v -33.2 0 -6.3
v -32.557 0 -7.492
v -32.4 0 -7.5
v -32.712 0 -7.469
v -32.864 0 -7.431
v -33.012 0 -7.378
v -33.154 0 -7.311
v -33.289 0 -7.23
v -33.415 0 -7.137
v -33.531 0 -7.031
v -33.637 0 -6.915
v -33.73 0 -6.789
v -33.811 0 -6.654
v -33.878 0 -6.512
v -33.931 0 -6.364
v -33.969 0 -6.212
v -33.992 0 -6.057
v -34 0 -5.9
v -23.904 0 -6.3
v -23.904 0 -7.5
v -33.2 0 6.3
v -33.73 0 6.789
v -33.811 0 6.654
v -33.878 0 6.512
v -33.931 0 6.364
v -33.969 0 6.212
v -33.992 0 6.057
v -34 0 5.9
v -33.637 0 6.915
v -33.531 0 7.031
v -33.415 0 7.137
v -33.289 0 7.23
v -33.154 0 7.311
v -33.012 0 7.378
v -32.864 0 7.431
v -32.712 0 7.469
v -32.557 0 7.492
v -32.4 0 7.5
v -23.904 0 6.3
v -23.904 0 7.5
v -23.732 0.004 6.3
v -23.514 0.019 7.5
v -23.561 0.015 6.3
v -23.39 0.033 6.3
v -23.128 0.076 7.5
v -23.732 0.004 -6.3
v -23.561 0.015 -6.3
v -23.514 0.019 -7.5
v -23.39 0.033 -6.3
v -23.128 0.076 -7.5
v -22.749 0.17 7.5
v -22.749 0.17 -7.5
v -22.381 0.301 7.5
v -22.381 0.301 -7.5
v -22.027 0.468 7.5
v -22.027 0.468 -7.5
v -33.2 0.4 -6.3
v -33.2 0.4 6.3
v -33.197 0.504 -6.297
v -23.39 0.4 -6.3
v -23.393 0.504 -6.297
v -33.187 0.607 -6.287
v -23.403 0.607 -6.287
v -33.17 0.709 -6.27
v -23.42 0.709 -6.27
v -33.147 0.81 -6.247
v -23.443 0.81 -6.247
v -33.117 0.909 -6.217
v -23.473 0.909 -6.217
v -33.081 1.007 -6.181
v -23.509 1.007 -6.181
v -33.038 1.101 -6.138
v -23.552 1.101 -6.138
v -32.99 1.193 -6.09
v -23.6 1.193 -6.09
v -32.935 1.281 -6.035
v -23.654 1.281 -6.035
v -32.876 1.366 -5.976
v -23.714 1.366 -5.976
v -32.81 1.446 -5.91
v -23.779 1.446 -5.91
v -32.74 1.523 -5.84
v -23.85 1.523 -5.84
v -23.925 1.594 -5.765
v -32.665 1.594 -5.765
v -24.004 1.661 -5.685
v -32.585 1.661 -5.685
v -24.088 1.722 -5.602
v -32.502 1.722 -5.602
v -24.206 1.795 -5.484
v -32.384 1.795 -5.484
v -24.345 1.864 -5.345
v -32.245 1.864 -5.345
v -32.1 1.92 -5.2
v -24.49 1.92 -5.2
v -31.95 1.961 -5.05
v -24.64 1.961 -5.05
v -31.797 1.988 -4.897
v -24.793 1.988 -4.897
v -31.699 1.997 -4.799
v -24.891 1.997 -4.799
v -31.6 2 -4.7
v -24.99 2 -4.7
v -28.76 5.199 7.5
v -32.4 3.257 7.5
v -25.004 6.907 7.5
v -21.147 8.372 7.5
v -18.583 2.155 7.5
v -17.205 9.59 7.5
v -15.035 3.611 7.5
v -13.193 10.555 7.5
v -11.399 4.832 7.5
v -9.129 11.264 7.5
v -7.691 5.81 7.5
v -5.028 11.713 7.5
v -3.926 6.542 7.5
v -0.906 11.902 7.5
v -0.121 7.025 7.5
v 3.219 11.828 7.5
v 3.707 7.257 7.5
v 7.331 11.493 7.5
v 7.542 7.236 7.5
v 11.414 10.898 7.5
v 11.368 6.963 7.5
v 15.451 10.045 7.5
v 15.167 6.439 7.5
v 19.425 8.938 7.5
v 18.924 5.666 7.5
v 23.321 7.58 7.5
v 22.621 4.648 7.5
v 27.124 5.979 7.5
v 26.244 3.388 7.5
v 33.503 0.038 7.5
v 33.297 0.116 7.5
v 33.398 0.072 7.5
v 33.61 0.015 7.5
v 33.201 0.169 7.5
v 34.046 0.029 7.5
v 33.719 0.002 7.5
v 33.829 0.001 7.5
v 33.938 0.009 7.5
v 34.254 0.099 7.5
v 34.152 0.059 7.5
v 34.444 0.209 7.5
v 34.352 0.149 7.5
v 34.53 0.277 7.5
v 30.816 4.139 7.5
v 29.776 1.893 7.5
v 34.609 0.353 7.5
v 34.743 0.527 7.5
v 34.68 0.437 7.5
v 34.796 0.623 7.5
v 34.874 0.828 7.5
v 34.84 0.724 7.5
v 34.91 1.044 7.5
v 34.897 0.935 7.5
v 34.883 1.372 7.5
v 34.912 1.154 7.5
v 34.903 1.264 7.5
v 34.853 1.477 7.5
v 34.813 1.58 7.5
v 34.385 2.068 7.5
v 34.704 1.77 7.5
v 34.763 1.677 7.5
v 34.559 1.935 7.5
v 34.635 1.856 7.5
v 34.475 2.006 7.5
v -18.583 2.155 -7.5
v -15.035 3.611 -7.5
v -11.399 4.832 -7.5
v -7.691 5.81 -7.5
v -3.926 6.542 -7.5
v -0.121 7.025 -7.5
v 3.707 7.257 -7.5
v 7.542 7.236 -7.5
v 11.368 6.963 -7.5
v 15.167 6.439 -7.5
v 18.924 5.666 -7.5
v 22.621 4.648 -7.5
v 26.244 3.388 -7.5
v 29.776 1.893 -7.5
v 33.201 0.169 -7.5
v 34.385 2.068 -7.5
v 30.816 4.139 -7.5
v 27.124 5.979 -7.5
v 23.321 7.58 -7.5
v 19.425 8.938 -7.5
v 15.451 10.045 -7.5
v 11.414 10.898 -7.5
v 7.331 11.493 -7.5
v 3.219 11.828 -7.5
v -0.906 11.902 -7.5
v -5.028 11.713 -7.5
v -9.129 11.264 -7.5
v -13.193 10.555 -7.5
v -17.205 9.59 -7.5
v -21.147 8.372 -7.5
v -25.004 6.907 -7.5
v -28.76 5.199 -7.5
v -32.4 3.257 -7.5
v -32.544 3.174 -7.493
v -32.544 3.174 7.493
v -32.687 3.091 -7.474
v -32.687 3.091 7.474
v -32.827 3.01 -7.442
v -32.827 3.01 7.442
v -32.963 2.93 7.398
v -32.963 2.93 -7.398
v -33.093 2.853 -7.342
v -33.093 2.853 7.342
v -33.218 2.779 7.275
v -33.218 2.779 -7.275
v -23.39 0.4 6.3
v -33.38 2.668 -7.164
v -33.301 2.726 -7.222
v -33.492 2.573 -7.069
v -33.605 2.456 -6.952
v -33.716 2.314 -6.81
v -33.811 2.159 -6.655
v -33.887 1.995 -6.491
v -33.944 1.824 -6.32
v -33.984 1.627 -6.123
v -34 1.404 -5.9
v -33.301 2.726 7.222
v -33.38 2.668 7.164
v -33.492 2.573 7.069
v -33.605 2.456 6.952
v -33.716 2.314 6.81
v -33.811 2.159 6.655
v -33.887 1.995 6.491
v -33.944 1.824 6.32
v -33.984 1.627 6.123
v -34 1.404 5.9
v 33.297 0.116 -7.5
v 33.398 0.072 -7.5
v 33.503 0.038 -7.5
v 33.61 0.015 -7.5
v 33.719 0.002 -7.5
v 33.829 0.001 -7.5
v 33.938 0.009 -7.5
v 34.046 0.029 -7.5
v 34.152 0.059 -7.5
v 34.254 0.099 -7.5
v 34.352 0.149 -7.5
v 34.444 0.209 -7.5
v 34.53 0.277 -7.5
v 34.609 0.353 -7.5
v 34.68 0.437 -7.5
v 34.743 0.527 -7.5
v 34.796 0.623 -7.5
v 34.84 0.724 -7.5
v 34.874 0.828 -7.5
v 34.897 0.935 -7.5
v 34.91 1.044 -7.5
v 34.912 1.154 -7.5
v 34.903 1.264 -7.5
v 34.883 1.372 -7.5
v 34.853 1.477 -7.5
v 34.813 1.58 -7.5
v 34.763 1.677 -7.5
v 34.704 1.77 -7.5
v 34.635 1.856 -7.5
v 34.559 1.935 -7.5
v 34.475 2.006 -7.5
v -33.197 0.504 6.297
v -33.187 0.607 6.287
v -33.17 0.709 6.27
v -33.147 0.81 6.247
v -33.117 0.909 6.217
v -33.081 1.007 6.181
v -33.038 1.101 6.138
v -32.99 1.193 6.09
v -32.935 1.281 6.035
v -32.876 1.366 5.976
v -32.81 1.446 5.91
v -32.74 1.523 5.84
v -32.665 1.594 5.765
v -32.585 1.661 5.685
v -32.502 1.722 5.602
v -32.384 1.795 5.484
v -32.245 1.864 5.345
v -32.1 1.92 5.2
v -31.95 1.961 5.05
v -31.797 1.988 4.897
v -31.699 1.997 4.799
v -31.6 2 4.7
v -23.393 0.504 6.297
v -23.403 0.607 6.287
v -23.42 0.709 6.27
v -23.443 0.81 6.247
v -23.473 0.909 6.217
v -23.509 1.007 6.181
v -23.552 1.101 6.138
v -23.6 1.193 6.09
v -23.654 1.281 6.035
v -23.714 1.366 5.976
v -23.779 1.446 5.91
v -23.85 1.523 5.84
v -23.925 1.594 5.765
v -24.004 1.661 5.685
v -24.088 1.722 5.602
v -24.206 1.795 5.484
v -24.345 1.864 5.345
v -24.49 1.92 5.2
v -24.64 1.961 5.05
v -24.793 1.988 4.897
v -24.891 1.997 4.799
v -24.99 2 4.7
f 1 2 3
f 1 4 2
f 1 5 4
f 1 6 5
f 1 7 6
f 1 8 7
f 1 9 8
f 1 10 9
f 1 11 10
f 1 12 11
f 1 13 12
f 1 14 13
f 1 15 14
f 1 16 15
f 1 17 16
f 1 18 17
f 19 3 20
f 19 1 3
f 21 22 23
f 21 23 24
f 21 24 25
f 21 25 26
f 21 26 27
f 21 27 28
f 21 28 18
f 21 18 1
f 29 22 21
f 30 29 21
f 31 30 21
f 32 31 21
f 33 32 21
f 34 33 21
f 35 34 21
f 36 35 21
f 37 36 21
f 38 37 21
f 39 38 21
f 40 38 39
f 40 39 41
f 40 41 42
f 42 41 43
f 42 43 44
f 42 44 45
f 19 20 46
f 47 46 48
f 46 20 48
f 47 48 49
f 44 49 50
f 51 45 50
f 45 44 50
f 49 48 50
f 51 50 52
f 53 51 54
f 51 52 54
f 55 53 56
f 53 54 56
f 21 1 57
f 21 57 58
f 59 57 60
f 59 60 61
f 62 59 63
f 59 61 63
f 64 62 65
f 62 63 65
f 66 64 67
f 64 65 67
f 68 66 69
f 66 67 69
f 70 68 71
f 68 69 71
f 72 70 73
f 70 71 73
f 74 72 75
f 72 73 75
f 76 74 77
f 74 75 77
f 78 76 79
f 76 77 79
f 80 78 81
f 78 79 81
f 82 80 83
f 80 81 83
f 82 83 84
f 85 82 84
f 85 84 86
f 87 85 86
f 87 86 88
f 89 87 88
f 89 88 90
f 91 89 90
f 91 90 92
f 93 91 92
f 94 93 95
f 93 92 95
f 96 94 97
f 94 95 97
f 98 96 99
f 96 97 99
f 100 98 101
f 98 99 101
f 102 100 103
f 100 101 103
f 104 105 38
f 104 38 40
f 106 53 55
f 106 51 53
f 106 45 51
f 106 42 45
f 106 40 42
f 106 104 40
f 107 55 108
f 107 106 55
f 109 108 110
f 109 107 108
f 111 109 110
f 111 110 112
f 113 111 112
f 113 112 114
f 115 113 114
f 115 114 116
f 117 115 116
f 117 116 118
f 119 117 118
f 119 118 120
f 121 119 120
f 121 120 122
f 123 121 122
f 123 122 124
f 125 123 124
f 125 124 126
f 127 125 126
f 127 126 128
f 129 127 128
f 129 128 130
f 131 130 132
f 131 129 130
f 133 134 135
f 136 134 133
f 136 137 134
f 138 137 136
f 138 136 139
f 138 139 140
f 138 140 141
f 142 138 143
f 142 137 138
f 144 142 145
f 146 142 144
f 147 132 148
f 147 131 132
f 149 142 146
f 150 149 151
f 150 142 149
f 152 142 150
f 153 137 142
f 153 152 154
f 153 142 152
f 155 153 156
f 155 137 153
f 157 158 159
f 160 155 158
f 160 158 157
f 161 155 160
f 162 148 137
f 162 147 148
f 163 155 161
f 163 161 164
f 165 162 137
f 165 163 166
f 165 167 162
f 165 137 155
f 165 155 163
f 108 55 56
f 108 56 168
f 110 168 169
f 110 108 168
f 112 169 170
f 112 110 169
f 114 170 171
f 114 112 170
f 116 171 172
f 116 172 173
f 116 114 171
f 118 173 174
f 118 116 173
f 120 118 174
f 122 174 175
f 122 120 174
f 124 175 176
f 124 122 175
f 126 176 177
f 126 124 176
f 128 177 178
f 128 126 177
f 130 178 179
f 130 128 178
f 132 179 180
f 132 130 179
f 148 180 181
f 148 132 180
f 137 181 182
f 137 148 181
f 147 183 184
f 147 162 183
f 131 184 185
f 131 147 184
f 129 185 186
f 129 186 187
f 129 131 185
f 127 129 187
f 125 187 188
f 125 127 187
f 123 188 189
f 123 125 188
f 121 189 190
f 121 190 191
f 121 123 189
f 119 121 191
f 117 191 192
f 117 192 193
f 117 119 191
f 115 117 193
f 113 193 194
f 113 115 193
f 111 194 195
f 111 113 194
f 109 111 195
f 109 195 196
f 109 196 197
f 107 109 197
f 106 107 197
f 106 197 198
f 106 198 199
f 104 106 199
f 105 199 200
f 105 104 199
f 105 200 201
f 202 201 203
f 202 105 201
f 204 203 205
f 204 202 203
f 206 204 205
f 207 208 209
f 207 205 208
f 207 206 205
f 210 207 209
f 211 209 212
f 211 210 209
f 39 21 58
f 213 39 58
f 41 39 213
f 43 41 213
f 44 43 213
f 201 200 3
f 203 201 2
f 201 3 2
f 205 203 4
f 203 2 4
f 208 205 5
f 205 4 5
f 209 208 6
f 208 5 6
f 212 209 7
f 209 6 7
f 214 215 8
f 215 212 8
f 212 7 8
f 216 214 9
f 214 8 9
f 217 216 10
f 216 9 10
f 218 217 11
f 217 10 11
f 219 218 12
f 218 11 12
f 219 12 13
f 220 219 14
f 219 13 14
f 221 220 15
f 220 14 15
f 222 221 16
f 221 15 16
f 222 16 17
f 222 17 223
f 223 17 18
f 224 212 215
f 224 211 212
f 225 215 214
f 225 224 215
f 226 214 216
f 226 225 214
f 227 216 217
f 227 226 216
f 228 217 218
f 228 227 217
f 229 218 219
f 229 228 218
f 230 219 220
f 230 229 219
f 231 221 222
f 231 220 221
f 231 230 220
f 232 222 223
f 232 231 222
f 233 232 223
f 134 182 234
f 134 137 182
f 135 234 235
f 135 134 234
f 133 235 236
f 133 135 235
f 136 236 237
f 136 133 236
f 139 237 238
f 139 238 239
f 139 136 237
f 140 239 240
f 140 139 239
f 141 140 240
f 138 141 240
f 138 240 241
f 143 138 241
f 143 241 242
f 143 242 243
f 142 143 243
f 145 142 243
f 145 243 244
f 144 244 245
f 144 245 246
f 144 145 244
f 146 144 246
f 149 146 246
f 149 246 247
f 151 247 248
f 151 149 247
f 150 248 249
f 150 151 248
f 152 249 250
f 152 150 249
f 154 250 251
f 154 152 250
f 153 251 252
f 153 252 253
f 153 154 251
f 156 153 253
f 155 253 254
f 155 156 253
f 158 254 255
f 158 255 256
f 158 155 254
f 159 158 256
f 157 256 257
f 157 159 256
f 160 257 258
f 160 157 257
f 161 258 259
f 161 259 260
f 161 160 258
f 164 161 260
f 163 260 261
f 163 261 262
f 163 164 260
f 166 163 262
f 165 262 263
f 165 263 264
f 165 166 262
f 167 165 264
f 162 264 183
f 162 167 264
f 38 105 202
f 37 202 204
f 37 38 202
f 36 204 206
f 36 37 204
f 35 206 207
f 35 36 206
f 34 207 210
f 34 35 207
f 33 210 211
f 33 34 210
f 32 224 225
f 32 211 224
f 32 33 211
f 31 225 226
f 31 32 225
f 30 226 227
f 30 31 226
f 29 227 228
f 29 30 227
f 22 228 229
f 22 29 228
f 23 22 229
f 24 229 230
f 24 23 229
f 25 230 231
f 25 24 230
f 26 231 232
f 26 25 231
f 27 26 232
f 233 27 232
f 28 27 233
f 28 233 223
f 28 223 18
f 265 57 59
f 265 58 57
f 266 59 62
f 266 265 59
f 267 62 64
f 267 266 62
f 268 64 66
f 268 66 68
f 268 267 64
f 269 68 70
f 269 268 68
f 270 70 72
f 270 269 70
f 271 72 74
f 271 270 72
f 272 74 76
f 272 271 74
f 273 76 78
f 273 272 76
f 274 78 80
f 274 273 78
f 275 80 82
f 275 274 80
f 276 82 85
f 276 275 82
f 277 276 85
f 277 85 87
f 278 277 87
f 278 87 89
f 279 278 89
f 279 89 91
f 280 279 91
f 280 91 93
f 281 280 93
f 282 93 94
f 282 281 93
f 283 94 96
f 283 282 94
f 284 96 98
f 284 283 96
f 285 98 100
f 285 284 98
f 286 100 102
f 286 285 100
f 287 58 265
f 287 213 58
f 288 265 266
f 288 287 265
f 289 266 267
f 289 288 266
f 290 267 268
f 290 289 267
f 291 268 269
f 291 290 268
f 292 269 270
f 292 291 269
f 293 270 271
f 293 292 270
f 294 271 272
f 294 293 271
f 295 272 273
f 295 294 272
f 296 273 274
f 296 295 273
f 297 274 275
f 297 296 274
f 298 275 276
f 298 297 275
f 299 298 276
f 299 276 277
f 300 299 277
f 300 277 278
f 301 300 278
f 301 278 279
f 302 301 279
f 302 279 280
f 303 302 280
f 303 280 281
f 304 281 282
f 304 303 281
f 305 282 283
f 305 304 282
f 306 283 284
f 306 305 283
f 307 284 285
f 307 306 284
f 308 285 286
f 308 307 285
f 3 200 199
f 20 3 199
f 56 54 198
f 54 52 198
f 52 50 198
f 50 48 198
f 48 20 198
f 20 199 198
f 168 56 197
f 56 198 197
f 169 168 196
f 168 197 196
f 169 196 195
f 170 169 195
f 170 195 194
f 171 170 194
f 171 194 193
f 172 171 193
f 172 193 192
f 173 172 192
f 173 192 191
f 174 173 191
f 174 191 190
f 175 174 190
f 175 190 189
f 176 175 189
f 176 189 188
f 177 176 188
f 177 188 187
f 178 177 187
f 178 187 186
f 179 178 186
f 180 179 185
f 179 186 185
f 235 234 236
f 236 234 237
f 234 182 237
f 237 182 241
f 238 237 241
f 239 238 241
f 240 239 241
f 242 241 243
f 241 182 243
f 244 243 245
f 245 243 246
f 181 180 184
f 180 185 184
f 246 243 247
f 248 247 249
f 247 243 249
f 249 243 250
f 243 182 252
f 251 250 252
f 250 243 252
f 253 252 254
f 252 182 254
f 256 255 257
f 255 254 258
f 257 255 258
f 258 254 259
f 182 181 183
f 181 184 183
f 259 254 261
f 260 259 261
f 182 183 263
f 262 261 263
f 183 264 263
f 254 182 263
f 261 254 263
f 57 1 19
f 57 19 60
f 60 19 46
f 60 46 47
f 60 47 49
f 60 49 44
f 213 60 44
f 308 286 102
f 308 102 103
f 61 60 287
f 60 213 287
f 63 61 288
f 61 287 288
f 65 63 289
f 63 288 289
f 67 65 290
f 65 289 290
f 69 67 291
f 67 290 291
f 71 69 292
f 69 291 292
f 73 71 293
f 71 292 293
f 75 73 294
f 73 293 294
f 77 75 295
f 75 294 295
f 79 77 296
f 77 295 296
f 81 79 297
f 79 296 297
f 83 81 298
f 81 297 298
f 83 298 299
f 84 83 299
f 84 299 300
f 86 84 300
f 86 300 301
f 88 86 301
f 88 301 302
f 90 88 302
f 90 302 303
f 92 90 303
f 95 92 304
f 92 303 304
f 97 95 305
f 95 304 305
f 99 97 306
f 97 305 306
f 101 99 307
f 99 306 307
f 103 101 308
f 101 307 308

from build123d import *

# Parameters (mm, degrees)
F1_DEPTH    = 7.5
F2_W        = 9.8101310167
F2_H        = 12.6
F3_DEPTH    = 2
F4_R        = 1.6
F5_T1_DEPTH = 20.0711055919


# Not quite as in the source:
# - a fillet or chamfer that OpenCascade refuses, or shapes differently, is made with other operations: its cross-section is extruded or revolved along the edge and cut away or added


with BuildPart() as f1:
    # F0 (on Top) → F1 (new body, symmetric)
    with BuildSketch(Plane.XY):
        with BuildLine():
            ThreePointArc((33.2014997867, 0.1693742672), (34.7428713669, 0.5269798189), (34.3852658153, 2.068351399))
            ThreePointArc((34.3852658153, 2.068351399), (0.2265050268, 11.9077038946), (-34, 2.3066544839))
            Line((-34, 2.3066544839), (-34, 0))
            Line((-34, 0), (-22.8898689833, 0))
            ThreePointArc((-22.8898689833, 0), (5.1340927179, 7.2785489292), (33.2014997867, 0.1693742672))
        make_face()
    extrude(amount=F1_DEPTH, both=True)

    # F2 (on Front) → F3 (cut)
    with BuildSketch(Plane.XZ):
        with Locations((-28.2949344917, 0)):
            Rectangle(F2_W, F2_H)
    extrude(amount=-F3_DEPTH, mode=Mode.SUBTRACT)

    # F4
    f4_edges = [f1.edges().sort_by_distance(p)[0] for p in [
        (-28.294934, 2, 6.3),
        (-33.2, 2, 0),
        (-28.294934, 2, -6.3),
        (-23.389869, 2, 0),
        (-34, 2.306654, 0),
        (-34, 1.153327, 7.5),
        (-34, 1.153327, -7.5),
    ]]
    fillet(f4_edges, radius=F4_R)

    # F5: fillet of radius 4 on 1 edges, made by hand

    # F5_s2 → F5_t1 (cut)
    with BuildSketch(Plane.XY.offset(-10.0355527959)):
        with BuildLine():
            ThreePointArc((-23.9040901017, 0), (-22.9370384998, 0.1186585825), (-22.0273613841, 0.4675944003))
            ThreePointArc((-22.0273613841, 0.4675944003), (-22.4595993901, 0.2356126314), (-22.8898689833, 0))
            Line((-22.8898689833, 0), (-23.9040901017, 0))
        make_face()
    extrude(amount=F5_T1_DEPTH, mode=Mode.SUBTRACT)


solid = f1.part
